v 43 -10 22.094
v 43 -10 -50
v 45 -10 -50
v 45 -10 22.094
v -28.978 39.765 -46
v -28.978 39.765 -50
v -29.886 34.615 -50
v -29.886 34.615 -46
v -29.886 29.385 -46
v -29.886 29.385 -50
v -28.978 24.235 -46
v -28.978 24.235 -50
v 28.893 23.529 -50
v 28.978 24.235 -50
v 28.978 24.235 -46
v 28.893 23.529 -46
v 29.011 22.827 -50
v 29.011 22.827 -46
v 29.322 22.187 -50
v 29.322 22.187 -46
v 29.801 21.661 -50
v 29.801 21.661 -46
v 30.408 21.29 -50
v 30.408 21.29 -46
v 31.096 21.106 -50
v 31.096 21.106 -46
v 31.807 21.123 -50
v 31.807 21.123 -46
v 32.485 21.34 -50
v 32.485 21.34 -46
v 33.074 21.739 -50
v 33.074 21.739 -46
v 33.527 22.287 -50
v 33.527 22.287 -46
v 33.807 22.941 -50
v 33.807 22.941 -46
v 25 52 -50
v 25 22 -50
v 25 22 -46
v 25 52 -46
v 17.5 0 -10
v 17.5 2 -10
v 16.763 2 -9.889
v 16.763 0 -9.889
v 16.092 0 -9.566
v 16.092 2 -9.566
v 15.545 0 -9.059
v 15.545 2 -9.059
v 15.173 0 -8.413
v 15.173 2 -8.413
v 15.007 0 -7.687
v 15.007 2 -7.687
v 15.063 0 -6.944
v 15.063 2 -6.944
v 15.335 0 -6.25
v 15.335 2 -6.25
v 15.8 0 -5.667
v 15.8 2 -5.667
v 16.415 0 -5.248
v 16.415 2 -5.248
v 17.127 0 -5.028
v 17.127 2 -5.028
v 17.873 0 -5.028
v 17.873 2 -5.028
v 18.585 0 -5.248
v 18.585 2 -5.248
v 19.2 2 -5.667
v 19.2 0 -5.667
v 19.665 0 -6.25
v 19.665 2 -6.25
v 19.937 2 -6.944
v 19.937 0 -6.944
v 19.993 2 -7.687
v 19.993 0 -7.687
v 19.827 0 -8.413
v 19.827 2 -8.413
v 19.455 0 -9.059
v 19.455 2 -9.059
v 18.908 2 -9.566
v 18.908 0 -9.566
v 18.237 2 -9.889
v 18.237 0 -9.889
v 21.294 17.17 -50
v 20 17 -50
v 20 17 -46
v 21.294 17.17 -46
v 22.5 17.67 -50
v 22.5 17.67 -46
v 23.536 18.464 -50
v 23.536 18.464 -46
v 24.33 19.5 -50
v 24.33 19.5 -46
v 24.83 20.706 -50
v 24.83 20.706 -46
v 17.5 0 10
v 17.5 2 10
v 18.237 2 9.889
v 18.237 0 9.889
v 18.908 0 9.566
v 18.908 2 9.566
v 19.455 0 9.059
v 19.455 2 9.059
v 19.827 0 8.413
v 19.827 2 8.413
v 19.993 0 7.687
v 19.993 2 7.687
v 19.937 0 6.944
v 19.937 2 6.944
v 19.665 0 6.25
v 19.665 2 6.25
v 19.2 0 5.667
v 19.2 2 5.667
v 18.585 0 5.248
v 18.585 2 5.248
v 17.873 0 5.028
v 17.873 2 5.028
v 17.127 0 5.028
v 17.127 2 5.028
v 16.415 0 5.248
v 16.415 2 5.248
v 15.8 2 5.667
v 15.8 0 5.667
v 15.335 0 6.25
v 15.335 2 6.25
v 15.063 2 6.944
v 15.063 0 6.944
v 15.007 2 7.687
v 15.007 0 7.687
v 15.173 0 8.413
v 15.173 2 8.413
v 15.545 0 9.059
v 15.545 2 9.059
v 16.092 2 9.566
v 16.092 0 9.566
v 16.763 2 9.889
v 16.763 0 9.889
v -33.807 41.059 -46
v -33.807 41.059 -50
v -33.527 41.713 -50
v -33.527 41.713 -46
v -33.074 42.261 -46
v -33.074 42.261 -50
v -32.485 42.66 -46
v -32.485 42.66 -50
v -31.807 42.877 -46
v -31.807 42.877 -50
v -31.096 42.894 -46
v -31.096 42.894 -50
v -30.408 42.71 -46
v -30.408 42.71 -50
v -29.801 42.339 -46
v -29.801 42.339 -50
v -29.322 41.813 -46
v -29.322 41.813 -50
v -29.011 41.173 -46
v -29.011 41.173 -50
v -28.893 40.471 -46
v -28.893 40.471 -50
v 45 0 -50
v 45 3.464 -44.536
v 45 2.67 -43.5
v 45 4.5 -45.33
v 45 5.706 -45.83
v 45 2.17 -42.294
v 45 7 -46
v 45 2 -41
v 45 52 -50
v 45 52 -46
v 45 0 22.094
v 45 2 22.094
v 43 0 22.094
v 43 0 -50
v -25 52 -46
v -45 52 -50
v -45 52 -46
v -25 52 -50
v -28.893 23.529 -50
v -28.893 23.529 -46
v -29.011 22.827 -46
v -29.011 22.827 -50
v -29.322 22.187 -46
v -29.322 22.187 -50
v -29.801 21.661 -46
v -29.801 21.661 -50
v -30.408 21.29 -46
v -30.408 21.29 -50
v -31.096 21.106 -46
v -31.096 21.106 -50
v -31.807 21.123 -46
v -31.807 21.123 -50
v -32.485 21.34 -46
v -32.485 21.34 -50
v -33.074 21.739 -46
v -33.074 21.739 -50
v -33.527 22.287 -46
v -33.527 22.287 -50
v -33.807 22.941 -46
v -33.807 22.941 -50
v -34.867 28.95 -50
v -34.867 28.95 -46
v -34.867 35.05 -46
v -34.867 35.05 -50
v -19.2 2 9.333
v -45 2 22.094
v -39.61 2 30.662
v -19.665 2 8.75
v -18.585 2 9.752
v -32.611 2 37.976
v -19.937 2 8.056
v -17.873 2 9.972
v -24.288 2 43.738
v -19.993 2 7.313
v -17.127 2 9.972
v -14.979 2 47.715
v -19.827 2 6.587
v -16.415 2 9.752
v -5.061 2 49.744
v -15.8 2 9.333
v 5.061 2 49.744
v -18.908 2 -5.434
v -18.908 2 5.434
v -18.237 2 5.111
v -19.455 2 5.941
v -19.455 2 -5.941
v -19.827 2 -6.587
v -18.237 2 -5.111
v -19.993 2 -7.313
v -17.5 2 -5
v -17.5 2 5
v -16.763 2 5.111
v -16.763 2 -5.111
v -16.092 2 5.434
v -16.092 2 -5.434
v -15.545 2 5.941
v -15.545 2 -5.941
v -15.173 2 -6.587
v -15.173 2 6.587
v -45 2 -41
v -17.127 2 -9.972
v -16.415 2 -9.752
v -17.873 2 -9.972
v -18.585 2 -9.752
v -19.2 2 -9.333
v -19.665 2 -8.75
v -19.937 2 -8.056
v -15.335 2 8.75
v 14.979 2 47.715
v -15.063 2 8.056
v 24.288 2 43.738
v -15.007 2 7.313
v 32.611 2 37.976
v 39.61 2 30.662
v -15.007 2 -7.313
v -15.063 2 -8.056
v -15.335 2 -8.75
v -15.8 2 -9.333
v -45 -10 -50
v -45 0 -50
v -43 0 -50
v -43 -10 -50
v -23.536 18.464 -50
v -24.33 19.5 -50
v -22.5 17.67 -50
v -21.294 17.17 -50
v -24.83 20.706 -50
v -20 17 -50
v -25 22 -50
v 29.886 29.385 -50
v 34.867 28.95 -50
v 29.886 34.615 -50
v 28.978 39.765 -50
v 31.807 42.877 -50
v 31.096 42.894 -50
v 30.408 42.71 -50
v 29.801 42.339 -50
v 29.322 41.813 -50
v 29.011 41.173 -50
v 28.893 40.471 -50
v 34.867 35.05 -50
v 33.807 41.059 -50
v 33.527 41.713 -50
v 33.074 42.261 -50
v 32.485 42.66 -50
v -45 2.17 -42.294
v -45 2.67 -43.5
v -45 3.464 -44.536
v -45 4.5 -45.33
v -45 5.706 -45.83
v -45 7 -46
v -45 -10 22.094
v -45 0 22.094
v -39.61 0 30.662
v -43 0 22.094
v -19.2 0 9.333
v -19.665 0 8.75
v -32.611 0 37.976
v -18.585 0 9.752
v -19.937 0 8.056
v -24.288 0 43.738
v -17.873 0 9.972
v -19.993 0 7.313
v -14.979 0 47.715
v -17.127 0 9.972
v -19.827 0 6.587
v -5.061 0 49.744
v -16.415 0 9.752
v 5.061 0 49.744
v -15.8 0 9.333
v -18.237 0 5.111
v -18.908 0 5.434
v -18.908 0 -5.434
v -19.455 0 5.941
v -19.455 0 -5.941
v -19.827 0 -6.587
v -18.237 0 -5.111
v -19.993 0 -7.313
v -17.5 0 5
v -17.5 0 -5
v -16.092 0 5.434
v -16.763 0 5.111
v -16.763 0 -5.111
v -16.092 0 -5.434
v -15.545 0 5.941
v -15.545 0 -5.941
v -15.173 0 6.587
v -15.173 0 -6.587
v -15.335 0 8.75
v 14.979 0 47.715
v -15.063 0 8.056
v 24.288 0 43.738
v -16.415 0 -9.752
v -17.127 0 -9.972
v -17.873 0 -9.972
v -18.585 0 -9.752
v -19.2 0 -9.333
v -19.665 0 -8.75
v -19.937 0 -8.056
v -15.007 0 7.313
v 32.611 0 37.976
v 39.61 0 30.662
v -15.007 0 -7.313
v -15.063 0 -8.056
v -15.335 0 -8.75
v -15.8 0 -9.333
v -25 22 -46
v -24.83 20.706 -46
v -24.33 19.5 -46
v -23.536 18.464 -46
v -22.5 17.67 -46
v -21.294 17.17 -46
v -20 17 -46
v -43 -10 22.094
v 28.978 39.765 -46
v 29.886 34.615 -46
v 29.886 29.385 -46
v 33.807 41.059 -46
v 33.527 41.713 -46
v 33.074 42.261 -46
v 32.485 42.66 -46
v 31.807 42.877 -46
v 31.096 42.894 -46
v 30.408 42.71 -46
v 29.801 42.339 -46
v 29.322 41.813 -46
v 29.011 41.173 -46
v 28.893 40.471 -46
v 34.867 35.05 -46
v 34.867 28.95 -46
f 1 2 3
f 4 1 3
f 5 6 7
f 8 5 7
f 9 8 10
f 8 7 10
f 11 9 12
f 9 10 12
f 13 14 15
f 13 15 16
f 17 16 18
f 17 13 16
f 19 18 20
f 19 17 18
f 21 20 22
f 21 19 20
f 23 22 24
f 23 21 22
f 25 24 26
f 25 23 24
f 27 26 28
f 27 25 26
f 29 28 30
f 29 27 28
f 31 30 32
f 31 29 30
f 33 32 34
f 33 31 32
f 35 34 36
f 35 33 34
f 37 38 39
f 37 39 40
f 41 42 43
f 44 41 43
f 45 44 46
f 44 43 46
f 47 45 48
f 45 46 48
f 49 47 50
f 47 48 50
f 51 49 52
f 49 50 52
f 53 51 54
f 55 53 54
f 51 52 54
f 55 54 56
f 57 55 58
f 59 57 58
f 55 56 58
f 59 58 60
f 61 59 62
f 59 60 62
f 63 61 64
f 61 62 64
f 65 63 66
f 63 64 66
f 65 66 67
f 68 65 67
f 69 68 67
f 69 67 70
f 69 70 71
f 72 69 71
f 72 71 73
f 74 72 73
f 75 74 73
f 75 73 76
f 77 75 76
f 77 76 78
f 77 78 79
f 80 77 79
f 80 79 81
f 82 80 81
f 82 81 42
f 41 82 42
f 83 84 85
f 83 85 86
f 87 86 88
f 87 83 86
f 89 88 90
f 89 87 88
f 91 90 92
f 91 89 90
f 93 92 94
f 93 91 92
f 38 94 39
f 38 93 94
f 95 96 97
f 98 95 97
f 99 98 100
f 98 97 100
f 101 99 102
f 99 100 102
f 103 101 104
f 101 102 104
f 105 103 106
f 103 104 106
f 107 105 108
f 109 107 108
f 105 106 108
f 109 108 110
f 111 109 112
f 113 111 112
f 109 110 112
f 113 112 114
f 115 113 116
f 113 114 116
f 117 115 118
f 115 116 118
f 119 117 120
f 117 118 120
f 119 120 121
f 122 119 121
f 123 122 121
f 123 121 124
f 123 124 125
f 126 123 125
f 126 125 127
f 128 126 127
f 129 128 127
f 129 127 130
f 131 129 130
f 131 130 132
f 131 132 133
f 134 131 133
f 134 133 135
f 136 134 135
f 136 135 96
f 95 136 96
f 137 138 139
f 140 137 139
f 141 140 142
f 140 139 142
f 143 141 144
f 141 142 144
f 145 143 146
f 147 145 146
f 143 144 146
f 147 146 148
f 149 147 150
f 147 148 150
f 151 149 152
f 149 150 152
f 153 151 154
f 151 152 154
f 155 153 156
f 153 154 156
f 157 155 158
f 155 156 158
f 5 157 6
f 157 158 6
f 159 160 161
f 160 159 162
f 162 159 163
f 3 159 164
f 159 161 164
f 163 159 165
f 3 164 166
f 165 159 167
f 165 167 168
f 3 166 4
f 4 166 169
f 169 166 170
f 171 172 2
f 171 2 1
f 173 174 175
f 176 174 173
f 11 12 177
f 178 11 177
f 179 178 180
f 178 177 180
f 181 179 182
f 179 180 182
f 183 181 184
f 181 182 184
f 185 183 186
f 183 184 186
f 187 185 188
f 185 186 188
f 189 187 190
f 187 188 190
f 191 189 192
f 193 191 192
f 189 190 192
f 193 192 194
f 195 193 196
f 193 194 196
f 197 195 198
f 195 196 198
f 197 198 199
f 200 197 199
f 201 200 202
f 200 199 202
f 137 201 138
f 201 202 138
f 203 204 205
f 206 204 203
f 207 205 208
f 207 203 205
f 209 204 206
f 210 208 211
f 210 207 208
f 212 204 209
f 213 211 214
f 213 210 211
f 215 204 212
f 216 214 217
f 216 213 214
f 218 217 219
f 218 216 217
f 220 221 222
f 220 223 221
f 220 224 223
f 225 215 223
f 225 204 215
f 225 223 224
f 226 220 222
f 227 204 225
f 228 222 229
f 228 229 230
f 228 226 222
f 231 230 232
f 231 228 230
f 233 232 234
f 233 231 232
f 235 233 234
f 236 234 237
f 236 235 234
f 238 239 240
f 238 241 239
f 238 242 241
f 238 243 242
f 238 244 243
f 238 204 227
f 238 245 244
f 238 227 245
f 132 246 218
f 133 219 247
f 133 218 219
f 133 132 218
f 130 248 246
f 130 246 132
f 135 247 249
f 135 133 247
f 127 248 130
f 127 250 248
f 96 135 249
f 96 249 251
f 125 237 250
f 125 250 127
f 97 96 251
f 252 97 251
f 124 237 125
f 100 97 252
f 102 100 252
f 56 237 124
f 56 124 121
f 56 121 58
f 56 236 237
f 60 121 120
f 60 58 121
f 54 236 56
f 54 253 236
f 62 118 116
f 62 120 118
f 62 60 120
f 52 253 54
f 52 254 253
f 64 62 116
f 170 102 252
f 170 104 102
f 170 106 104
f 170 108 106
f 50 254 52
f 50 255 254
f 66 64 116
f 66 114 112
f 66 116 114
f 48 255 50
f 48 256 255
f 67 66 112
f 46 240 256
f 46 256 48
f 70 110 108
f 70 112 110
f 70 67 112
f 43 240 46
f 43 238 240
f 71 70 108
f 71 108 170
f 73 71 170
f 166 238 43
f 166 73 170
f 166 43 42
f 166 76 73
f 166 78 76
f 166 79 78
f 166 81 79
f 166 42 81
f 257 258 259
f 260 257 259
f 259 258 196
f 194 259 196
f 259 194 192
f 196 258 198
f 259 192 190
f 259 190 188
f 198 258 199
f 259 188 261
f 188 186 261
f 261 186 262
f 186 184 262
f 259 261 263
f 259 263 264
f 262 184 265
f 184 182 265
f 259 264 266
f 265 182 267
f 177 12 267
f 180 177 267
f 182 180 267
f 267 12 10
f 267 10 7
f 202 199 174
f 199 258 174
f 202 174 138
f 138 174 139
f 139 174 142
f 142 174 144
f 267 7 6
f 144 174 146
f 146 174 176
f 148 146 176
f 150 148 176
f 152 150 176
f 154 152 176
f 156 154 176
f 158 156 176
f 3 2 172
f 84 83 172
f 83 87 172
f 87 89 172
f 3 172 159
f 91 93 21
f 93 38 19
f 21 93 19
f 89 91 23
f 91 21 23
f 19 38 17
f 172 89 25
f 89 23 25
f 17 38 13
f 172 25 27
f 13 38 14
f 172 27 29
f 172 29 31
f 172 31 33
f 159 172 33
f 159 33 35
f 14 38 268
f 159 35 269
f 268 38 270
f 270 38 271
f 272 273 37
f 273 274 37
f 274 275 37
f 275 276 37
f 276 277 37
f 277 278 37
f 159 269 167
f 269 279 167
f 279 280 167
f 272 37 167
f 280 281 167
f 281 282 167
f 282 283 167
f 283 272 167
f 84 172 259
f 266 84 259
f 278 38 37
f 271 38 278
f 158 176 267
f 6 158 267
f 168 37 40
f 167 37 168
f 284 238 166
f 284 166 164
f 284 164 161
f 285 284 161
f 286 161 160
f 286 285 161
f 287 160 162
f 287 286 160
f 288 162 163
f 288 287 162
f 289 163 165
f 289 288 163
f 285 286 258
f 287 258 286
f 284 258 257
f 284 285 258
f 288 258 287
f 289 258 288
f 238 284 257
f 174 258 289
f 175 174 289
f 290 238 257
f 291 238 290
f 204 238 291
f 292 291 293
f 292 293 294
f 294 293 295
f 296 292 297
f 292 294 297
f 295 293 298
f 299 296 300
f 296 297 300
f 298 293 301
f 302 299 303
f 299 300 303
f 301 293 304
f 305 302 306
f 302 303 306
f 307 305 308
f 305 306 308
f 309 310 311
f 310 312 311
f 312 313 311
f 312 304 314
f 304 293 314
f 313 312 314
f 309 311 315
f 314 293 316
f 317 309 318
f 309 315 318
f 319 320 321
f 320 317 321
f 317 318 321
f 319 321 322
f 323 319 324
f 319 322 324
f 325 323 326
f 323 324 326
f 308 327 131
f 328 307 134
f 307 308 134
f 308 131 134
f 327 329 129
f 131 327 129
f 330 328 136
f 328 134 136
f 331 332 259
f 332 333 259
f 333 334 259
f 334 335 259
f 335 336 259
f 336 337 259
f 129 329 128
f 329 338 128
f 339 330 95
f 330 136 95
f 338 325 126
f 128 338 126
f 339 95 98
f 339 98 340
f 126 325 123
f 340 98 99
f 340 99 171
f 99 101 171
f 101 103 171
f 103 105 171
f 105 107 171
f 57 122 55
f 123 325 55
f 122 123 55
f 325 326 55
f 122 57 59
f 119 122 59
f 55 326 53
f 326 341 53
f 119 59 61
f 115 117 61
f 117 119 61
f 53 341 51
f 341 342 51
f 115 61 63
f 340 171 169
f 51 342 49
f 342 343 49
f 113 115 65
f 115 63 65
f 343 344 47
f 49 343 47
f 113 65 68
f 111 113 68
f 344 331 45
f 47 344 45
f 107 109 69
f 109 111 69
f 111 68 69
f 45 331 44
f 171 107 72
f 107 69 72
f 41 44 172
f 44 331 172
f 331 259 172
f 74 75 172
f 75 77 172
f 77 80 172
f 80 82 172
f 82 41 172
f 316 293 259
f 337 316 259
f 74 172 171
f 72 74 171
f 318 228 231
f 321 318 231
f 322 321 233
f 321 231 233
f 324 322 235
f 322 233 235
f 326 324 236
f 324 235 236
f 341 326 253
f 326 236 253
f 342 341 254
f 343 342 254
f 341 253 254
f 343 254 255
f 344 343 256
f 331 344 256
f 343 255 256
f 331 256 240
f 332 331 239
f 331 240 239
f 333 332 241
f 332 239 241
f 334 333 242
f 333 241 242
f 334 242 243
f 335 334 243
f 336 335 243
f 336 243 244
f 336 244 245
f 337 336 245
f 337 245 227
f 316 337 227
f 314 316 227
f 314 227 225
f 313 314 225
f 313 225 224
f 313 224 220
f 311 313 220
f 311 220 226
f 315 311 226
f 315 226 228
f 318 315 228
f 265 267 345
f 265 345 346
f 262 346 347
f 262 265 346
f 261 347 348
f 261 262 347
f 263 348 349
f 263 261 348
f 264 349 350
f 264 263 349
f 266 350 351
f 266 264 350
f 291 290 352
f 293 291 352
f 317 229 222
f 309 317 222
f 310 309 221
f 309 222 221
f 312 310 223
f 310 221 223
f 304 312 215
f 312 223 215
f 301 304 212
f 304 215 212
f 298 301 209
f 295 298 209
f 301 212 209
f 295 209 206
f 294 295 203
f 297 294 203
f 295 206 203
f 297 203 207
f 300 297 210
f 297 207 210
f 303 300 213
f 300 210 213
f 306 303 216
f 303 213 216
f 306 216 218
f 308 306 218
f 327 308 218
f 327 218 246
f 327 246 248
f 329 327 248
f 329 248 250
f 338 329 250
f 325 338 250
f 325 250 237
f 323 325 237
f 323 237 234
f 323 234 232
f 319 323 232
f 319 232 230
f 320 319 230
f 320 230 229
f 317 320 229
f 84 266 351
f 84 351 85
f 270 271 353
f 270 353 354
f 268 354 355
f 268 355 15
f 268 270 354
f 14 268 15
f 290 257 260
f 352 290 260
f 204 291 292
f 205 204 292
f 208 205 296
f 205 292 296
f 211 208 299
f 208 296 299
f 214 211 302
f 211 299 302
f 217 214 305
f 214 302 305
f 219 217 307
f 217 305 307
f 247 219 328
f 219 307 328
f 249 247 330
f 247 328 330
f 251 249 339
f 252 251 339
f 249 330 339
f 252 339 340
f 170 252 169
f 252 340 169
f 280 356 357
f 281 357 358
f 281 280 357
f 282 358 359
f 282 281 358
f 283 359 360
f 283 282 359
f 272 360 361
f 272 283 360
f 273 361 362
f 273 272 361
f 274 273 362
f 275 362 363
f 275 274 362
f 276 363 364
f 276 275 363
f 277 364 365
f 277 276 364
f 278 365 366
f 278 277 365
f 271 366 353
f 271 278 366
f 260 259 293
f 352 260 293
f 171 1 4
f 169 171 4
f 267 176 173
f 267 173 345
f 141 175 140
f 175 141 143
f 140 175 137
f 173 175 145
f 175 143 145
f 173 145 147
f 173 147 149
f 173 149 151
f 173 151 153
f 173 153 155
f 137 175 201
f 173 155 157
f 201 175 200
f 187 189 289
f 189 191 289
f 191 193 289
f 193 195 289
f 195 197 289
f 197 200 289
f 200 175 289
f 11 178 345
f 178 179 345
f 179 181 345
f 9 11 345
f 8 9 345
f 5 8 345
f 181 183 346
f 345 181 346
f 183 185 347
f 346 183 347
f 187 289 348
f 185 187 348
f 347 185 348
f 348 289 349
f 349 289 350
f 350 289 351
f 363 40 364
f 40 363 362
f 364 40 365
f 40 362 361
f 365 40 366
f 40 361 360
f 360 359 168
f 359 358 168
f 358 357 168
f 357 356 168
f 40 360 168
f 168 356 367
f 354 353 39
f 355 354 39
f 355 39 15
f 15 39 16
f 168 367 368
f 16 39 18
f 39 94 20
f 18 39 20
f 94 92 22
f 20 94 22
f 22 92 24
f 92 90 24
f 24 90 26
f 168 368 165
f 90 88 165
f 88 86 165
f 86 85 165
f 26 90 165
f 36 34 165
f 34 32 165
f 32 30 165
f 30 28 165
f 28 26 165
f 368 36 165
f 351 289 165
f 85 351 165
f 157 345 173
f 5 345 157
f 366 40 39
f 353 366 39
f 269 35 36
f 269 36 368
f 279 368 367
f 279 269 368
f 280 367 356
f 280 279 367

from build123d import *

# Parameters (mm, degrees)
SKETCH1_W                = 200
SKETCH1_H                = 100
BOSS_EXTRUDE1_DEPTH      = 2
BOSS_EXTRUDE2_DEPTH      = 50
CUT_EXTRUDE6_DEPTH       = 50
CUT_EXTRUDE7_DEPTH       = 50
SKETCH9_R                = 2.5
CUT_EXTRUDE8_DEPTH       = 20
CUT_EXTRUDE20_DEPTH      = 123.474487139
CUT_EXTRUDE20_DEPTH_BACK = 123.474487139
BOSS_EXTRUDE5_DEPTH      = 90
CUT_EXTRUDE28_DEPTH      = 84.815273071
CUT_EXTRUDE28_DEPTH_BACK = 84.815273071
SKETCH25_W               = 2
SKETCH25_H               = 72.093516731
BOSS_EXTRUDE7_DEPTH      = 10


with BuildPart() as part:
    # Sketch1 → Boss-Extrude1 (new body)
    with BuildSketch(Plane(origin=(0, 0, 0), x_dir=(1, 0, 0), z_dir=(0, 1, 0))):
        Rectangle(SKETCH1_W, SKETCH1_H)
    extrude(amount=BOSS_EXTRUDE1_DEPTH)

    # Sketch3 → Boss-Extrude2 (add)
    with BuildSketch(Plane(origin=(0, 2, 0), x_dir=(1, 0, 0), z_dir=(0, 1, 0))):
        Polygon((0, 50), (-45, 50), (-45, 46), (45, 46), (45, 50), align=None)
    extrude(amount=BOSS_EXTRUDE2_DEPTH)

    # Sketch4 → Cut-Extrude6 (cut)
    with BuildSketch(Plane(origin=(0, 0, -50), x_dir=(-1, 0, 0), z_dir=(0, 0, -1))):
        with BuildLine():
            Line((25, 52), (25, 22))
            ThreePointArc((25, 22), (23.535533906, 18.464466094), (20, 17))
            Line((20, 17), (-20, 17))
            ThreePointArc((-20, 17), (-23.535533906, 18.464466094), (-25, 22))
            Line((-25, 22), (-25, 52))
            Line((-25, 52), (25, 52))
        make_face()
    extrude(amount=-CUT_EXTRUDE6_DEPTH, mode=Mode.SUBTRACT)

    # Sketch5 → Cut-Extrude7 (cut)
    with BuildSketch(Plane(origin=(0, 0, -50), x_dir=(-1, 0, 0), z_dir=(0, 0, -1))):
        with BuildLine():
            ThreePointArc((-28.977774789, 39.764571353), (-30, 32), (-28.977774789, 24.235428647))
            ThreePointArc((-28.977774789, 24.235428647), (-30.745541742, 21.173566468), (-33.80740392, 22.941333421))
            ThreePointArc((-33.80740392, 22.941333421), (-35, 32), (-33.80740392, 41.058666579))
            ThreePointArc((-33.80740392, 41.058666579), (-30.745541742, 42.826433532), (-28.977774789, 39.764571353))
        make_face()
        with BuildLine():
            ThreePointArc((28.977774789, 24.235428647), (30.745541742, 21.173566468), (33.80740392, 22.941333421))
            ThreePointArc((33.80740392, 22.941333421), (35, 32), (33.80740392, 41.058666579))
            ThreePointArc((33.80740392, 41.058666579), (30.745541742, 42.826433532), (28.977774789, 39.764571353))
            ThreePointArc((28.977774789, 39.764571353), (30, 32), (28.977774789, 24.235428647))
        make_face()
    extrude(amount=-CUT_EXTRUDE7_DEPTH, mode=Mode.SUBTRACT)

    # Sketch9 → Cut-Extrude8 (cut)
    with BuildSketch(Plane(origin=(0, 2, 0), x_dir=(1, 0, 0), z_dir=(0, 1, 0))):
        with Locations(Location((-17.5, 7.5, 0), (0, 0, 270))):
            Circle(SKETCH9_R)
        with Locations(Location((17.5, 7.5, 0), (0, 0, 90))):
            Circle(SKETCH9_R)
        with Locations(Location((17.5, -7.5, 0), (0, 0, 270))):
            Circle(SKETCH9_R)
        with Locations(Location((-17.5, -7.5, 0), (0, 0, 90))):
            Circle(SKETCH9_R)
    extrude(amount=-CUT_EXTRUDE8_DEPTH, mode=Mode.SUBTRACT)

    # Sketch17 → Cut-Extrude20 (cut, two sides: drawn at the far end of the back side and taken through both)
    with BuildSketch(Plane(origin=(0, 2, 0), x_dir=(1, 0, 0), z_dir=(0, 1, 0)).offset(-CUT_EXTRUDE20_DEPTH_BACK)):
        Polygon((-45, 46), (-45, 50), (-100, 50), (-100, -50), (-45, -50), align=None)
        Polygon((45, 50), (45, 46), (45, -50), (100, -50), (100, 50), align=None)
    extrude(amount=CUT_EXTRUDE20_DEPTH + CUT_EXTRUDE20_DEPTH_BACK, mode=Mode.SUBTRACT)

    # Sketch18 → Boss-Extrude5 (add)
    with BuildSketch(Plane.ZY.offset(45)):
        with BuildLine():
            Line((-46, 7), (-46, 2))
            Line((-46, 2), (-41, 2))
            ThreePointArc((-41, 2), (-44.535533906, 3.464466094), (-46, 7))
        make_face()
    extrude(amount=-BOSS_EXTRUDE5_DEPTH)

    # Sketch24 → Cut-Extrude28 (cut, two sides: drawn at the far end of the back side and taken through both)
    with BuildSketch(Plane(origin=(0, 2, 0), x_dir=(1, 0, 0), z_dir=(0, 1, 0)).offset(-CUT_EXTRUDE28_DEPTH_BACK)):
        with BuildLine():
            Line((-151.955597575, 193.459233006), (-45, -22.093516731))
            ThreePointArc((-45, -22.093516731), (0, -50), (45, -22.093516731))
            Line((45, -22.093516731), (151.955597575, 193.459233006))
            Line((151.955597575, 193.459233006), (151.955597575, -287.79948233))
            Line((151.955597575, -287.79948233), (-151.955597575, -287.79948233))
            Line((-151.955597575, -287.79948233), (-151.955597575, 193.459233006))
        make_face()
    extrude(amount=CUT_EXTRUDE28_DEPTH + CUT_EXTRUDE28_DEPTH_BACK, mode=Mode.SUBTRACT)

    # Sketch25 → Boss-Extrude7 (add)
    with BuildSketch(Plane.XZ):
        with Locations((-44, -13.953241634)):
            Rectangle(SKETCH25_W, SKETCH25_H)
        with Locations((44, -13.953241634)):
            Rectangle(SKETCH25_W, SKETCH25_H)
    extrude(amount=BOSS_EXTRUDE7_DEPTH)


solid = part.part
